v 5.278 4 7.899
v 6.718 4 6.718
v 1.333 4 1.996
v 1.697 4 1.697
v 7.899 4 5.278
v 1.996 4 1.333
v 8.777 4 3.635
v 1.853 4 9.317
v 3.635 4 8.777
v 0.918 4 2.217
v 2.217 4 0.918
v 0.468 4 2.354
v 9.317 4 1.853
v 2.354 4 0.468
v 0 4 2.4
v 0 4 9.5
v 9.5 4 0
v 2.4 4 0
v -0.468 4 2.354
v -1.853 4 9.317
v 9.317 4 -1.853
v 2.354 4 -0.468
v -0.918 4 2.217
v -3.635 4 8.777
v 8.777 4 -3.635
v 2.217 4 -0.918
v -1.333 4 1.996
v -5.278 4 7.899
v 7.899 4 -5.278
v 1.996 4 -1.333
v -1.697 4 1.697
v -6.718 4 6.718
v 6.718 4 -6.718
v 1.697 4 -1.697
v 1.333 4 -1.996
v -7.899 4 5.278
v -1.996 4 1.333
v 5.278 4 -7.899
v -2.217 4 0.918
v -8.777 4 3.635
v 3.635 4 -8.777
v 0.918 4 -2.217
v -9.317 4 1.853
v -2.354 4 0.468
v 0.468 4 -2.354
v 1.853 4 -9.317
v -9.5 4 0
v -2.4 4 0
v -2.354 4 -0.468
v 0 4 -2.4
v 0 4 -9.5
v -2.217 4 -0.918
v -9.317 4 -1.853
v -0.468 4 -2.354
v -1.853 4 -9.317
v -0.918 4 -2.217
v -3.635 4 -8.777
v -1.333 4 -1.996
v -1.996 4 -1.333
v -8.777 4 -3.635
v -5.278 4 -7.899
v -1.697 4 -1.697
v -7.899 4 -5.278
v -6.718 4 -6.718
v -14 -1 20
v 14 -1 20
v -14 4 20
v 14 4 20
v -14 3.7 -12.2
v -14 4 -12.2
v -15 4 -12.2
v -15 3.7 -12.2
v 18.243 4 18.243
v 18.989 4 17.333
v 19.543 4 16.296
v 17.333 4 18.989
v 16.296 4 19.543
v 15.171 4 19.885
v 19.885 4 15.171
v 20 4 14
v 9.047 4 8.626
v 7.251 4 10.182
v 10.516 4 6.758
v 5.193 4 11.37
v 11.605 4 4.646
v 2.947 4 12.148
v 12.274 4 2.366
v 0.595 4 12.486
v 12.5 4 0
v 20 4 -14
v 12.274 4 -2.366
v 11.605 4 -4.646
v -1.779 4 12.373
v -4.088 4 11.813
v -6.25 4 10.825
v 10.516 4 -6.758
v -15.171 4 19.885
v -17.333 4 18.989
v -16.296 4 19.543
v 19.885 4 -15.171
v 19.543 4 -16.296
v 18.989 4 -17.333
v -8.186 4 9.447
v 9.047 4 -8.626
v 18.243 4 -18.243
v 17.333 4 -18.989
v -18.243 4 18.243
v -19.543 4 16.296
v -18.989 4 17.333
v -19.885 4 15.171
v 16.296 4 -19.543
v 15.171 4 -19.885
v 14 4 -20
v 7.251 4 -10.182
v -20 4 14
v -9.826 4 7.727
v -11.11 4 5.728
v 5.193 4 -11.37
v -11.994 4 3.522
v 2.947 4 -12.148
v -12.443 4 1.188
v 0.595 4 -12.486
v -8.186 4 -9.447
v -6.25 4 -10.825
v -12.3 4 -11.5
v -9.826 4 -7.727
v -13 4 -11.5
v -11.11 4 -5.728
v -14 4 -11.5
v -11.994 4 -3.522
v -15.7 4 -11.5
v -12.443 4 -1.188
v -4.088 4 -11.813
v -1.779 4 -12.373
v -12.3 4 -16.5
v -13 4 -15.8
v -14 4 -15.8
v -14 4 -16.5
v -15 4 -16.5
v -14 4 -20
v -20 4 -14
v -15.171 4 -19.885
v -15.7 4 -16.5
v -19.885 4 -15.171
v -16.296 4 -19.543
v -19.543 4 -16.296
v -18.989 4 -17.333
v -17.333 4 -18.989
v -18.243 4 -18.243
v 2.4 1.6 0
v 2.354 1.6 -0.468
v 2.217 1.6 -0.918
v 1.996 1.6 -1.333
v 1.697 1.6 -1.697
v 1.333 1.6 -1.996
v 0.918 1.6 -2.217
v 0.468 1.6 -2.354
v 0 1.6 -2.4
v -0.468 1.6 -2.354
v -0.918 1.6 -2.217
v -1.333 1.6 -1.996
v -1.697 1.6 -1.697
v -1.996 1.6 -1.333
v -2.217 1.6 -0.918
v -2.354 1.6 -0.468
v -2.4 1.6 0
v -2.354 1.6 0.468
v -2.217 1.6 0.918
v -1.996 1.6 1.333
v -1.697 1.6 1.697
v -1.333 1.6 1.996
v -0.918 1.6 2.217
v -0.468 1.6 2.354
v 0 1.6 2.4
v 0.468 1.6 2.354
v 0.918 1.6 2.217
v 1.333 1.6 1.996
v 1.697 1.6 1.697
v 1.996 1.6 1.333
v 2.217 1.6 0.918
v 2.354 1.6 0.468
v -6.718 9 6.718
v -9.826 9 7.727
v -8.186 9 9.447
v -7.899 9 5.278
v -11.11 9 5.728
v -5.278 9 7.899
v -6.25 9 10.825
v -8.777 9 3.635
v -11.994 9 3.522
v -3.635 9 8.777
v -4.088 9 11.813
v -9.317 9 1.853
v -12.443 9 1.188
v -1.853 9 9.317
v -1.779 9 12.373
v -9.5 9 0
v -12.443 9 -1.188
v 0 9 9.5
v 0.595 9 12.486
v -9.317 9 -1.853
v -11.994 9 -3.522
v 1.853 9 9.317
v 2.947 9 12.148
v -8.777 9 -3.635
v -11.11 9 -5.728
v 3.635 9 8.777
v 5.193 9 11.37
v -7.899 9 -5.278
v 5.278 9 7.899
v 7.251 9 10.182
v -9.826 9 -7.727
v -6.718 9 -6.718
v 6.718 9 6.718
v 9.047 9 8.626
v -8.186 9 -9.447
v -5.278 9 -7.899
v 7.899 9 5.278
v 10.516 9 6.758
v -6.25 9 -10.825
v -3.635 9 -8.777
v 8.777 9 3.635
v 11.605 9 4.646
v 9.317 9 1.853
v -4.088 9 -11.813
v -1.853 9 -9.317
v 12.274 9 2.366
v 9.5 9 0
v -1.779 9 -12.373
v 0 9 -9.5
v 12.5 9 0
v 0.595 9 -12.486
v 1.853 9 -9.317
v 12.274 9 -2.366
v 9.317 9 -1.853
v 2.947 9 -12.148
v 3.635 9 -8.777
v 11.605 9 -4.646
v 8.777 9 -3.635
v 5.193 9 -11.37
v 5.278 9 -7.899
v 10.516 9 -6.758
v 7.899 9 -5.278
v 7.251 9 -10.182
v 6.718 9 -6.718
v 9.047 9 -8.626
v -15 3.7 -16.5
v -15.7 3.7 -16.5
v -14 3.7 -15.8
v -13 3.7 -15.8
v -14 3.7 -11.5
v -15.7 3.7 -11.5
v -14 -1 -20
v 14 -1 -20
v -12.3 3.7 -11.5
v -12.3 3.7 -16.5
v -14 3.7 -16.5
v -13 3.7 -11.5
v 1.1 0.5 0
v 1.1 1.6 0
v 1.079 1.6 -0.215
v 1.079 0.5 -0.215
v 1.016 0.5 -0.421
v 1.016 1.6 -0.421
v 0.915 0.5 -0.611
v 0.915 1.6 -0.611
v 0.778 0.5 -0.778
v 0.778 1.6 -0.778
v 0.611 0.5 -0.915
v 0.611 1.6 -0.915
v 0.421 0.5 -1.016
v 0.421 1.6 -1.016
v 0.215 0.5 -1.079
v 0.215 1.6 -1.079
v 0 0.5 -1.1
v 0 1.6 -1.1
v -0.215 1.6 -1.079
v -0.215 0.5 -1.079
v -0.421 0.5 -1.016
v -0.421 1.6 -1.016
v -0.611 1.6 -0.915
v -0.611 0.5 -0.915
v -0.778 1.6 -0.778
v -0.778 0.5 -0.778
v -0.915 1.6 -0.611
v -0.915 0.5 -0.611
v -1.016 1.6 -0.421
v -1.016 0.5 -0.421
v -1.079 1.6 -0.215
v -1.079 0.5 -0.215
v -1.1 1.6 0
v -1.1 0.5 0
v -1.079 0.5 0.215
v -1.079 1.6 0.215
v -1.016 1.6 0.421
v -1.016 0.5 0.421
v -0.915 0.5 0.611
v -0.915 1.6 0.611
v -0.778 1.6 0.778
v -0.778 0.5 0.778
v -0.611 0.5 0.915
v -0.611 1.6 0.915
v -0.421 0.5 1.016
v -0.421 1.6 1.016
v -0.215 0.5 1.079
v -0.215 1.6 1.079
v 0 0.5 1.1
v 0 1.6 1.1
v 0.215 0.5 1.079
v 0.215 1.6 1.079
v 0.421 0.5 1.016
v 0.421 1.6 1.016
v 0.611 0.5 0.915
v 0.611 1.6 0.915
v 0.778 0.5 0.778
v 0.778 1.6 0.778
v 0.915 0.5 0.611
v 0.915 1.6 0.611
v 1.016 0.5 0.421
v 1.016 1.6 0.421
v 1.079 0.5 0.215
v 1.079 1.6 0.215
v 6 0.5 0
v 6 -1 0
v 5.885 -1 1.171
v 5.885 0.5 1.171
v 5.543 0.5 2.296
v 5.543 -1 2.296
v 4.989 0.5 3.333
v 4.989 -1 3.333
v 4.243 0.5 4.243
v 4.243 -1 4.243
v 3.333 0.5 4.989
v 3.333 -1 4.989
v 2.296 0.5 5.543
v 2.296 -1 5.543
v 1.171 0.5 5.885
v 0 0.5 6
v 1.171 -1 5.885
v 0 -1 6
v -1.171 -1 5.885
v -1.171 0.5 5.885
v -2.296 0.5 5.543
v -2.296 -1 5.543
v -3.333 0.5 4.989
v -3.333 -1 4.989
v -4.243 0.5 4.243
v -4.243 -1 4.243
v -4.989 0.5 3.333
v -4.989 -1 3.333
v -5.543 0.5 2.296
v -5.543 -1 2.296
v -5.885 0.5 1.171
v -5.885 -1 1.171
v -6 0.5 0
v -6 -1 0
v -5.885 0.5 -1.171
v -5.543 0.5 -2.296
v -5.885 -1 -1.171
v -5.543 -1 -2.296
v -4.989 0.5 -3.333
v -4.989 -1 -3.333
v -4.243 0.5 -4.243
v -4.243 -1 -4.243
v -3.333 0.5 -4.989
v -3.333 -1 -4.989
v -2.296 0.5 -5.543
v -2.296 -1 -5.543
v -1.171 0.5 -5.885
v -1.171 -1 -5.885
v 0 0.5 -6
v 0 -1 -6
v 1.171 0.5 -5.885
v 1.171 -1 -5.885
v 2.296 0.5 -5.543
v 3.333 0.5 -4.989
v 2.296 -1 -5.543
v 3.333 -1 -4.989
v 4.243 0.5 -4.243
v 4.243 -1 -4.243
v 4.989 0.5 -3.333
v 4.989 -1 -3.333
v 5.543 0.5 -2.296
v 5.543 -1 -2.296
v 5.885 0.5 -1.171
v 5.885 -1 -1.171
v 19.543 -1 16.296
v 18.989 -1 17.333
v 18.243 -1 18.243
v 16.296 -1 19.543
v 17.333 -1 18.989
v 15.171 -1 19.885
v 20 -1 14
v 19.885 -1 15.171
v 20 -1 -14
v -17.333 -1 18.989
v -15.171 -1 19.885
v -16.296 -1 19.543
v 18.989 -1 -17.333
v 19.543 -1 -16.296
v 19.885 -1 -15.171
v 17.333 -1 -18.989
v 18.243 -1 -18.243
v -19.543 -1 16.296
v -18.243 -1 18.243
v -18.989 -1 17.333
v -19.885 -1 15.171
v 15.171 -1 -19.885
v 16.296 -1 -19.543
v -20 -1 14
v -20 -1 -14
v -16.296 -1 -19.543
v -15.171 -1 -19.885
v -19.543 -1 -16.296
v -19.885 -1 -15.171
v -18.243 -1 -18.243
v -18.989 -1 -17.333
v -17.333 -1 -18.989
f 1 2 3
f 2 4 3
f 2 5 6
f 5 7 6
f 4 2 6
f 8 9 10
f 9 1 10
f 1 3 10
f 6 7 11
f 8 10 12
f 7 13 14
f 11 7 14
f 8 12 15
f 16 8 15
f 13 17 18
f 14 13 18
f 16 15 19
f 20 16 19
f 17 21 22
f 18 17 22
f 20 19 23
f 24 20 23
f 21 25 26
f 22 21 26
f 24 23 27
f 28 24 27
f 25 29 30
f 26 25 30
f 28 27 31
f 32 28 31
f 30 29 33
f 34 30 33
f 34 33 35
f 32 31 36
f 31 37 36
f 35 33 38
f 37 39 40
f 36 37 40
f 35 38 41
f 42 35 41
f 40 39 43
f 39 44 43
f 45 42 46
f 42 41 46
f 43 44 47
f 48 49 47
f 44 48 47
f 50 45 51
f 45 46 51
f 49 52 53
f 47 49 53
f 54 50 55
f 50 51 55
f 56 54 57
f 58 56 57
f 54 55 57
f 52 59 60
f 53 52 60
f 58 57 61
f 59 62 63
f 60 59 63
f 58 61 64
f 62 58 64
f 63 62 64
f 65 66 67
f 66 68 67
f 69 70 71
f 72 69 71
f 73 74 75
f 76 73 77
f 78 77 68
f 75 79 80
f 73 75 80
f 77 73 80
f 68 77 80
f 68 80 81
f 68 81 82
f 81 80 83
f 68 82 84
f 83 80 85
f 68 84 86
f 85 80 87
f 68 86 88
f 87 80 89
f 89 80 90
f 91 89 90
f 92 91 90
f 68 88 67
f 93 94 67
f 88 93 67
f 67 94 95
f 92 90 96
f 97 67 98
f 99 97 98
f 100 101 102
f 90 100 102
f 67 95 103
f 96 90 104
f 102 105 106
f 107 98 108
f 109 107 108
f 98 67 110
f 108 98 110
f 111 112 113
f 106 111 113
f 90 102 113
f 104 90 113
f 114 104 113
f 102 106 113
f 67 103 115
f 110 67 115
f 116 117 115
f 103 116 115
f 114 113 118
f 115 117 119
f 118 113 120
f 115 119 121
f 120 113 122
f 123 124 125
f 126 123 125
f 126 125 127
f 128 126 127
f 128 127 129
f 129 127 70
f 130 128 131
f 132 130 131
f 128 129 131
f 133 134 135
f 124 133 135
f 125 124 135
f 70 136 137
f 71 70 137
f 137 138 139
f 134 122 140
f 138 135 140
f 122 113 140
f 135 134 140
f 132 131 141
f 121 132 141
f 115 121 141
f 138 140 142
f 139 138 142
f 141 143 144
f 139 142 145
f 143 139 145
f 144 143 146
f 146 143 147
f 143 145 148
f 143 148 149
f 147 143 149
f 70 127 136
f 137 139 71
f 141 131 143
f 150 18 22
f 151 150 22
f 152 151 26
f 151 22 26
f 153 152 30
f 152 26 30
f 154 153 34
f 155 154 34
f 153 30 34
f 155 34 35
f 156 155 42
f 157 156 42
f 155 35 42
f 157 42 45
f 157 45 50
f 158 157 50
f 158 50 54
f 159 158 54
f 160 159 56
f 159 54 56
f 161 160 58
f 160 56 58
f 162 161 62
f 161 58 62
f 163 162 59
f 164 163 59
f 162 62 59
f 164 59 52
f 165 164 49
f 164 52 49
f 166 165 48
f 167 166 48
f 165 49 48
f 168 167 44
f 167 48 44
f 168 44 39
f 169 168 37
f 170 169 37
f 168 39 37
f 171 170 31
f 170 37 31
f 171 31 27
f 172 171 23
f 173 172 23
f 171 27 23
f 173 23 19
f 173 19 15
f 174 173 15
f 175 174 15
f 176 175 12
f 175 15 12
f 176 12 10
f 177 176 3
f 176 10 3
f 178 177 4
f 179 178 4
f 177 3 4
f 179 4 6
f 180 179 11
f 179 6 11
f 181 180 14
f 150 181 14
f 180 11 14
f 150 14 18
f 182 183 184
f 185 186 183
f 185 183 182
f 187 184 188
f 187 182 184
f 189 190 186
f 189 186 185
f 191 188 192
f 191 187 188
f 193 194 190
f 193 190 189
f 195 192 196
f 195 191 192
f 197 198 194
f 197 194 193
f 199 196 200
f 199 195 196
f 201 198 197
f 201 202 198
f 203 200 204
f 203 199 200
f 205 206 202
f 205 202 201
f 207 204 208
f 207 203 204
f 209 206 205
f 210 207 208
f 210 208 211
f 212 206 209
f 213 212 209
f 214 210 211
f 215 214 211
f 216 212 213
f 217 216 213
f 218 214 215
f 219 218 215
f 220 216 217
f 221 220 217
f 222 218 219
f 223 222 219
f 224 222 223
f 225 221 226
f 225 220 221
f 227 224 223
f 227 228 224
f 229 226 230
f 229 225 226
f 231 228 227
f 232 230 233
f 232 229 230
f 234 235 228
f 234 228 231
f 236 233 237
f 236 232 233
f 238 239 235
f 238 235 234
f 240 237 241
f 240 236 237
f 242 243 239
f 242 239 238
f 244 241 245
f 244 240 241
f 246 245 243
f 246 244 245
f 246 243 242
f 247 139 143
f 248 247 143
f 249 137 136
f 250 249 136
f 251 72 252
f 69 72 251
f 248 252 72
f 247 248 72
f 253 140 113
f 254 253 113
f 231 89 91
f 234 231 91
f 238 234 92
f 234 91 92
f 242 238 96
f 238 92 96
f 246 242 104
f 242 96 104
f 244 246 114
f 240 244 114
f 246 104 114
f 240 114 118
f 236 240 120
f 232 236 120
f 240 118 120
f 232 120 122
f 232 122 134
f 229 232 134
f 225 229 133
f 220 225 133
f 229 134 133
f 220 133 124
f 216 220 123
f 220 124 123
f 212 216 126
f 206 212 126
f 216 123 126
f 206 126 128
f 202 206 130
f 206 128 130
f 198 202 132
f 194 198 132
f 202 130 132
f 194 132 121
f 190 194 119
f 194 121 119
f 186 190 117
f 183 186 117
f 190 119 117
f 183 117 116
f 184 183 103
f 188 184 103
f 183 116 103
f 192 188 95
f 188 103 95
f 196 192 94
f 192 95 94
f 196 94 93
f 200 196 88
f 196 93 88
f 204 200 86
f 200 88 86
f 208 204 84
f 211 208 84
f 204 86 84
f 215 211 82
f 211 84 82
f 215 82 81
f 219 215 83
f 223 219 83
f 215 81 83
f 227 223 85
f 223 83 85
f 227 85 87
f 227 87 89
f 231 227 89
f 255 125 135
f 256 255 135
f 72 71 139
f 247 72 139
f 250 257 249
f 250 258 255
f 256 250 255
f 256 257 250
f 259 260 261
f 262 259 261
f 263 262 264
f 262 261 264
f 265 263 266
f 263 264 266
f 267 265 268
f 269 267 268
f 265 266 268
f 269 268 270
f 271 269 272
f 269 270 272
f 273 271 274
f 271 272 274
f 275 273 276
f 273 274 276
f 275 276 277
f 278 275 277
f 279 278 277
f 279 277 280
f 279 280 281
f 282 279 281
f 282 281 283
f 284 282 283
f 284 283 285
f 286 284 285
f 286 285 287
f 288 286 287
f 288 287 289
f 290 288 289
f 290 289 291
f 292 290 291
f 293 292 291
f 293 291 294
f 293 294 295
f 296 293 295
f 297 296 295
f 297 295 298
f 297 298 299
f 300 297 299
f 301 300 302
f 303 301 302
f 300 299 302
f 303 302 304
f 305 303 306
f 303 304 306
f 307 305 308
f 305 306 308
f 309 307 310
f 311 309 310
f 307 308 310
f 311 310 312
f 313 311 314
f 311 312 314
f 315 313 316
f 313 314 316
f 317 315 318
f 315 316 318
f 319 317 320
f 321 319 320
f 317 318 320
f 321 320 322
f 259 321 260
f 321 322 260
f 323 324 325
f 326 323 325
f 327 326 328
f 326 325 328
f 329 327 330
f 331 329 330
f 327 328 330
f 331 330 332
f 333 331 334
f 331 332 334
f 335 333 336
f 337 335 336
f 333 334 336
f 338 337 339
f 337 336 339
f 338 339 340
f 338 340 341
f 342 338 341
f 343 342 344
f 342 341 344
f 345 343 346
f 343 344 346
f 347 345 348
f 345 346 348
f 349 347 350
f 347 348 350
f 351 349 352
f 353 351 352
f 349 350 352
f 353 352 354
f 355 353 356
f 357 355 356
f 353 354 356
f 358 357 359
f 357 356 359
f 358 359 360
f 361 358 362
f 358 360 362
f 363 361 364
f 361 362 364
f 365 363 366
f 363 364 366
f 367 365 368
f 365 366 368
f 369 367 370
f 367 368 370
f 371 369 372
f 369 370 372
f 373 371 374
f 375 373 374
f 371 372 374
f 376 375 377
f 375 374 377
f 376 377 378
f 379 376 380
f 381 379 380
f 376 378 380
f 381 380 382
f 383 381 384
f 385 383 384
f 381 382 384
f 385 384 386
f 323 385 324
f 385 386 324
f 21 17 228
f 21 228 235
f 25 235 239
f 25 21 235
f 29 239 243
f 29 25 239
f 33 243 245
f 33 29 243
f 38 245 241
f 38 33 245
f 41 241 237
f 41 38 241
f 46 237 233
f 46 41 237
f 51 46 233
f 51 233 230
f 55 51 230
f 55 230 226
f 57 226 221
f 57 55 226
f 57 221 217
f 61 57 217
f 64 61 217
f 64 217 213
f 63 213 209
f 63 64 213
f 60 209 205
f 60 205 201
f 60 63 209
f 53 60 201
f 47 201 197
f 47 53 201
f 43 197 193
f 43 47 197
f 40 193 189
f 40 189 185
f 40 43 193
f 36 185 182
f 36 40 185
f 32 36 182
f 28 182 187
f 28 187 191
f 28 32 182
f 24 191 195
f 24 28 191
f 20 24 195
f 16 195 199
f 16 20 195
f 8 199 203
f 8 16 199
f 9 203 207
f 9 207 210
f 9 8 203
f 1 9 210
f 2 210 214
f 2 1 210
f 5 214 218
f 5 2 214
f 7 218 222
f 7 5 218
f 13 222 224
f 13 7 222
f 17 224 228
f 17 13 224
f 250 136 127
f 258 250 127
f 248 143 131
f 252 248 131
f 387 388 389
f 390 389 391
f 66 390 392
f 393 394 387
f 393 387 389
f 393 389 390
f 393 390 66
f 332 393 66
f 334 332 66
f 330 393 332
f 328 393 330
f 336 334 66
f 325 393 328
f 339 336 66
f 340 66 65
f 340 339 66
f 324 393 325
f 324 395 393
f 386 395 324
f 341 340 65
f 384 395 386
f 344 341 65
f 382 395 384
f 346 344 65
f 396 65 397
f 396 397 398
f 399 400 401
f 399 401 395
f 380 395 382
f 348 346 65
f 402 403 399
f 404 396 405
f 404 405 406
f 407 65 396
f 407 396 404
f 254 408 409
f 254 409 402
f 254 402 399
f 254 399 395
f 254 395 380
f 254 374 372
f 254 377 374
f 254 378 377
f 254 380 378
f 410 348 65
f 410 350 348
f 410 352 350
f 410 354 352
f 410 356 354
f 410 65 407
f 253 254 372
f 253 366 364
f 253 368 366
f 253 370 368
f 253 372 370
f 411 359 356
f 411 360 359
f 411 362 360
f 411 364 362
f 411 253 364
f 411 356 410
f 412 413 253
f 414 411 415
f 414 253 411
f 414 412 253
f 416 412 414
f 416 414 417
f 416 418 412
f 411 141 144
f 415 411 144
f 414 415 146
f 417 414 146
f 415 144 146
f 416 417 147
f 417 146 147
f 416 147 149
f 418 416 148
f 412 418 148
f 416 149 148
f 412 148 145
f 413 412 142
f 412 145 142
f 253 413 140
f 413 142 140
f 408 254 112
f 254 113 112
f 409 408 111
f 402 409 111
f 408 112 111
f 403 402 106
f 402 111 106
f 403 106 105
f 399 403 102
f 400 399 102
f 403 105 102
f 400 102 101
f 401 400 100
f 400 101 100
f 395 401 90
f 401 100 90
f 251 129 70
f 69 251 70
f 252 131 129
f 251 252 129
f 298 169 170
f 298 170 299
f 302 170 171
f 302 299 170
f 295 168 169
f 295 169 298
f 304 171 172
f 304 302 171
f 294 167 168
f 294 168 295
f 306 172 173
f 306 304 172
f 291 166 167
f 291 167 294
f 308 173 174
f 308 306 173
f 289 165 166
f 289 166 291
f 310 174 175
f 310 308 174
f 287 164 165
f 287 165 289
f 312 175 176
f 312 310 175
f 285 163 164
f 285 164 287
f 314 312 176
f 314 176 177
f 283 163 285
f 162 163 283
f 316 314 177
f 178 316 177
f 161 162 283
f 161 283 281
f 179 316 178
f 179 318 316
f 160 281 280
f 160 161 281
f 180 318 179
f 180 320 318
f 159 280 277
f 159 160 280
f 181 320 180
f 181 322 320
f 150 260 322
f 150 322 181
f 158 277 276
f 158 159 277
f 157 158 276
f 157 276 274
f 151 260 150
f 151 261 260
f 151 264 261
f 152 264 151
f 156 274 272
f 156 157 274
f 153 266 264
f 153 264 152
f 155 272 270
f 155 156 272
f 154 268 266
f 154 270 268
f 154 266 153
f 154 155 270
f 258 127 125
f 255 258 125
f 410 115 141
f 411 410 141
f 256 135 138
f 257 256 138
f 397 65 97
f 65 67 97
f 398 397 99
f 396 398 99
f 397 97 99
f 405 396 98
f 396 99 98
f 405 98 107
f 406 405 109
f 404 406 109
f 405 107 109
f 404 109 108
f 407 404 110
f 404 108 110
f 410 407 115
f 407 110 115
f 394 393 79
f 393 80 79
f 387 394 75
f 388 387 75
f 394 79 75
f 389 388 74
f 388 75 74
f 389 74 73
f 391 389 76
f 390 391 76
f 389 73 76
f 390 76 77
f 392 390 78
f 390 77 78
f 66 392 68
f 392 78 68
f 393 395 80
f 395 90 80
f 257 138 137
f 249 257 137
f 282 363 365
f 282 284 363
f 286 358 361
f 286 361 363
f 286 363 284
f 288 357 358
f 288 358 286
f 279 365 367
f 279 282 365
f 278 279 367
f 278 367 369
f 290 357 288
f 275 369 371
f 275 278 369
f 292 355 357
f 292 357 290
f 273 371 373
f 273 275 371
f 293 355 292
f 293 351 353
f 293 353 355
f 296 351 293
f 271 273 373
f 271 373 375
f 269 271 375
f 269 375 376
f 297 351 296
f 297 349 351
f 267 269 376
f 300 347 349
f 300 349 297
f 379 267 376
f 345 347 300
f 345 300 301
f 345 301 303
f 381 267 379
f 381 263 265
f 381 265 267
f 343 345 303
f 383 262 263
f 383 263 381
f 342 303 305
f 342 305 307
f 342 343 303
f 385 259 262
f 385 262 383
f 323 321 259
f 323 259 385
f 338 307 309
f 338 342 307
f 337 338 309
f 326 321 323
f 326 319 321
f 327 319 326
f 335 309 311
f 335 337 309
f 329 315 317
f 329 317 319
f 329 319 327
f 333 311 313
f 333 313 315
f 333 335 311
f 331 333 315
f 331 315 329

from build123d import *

# Parameters (mm, degrees)
SALIENTE_EXTRUIR1_DEPTH      = 4
SALIENTE_EXTRUIR1_DEPTH_BACK = 1
CROQUIS4_R                   = 6
CORTAR_EXTRUIR1_DEPTH        = 1.5
CROQUIS8_R                   = 2.4
CORTAR_EXTRUIR2_DEPTH        = 2.4
CORTAR_EXTRUIR3_REACH        = 4.6
CROQUIS9_R                   = 1.1
CROQUIS10_R                  = 12.5
CROQUIS10_R_2                = 9.5
EXTRUIR_L_MINA1_DEPTH        = 5
CORTAR_EXTRUIR4_DEPTH        = 0.3


with BuildPart() as part:
    # Croquis1 → Saliente-Extruir1 (new body, two sides)
    with BuildSketch(Plane(origin=(0, 0, 0), x_dir=(1, 0, 0), z_dir=(0, 1, 0))) as saliente_extruir1_sk:
        with BuildLine():
            Line((-14, 20), (14, 20))
            ThreePointArc((14, 20), (18.242640687, 18.242640687), (20, 14))
            Line((20, 14), (20, -14))
            ThreePointArc((20, -14), (18.242640687, -18.242640687), (14, -20))
            Line((14, -20), (-14, -20))
            ThreePointArc((-14, -20), (-18.242640687, -18.242640687), (-20, -14))
            Line((-20, -14), (-20, 14))
            ThreePointArc((-20, 14), (-18.242640687, 18.242640687), (-14, 20))
        make_face()
    extrude(amount=SALIENTE_EXTRUIR1_DEPTH)
    extrude(saliente_extruir1_sk.sketch, amount=-SALIENTE_EXTRUIR1_DEPTH_BACK)

    # Croquis4 → Cortar-Extruir1 (cut)
    with BuildSketch(Plane.XZ.offset(1)):
        Circle(CROQUIS4_R)
    extrude(amount=-CORTAR_EXTRUIR1_DEPTH, mode=Mode.SUBTRACT)

    # Croquis8 → Cortar-Extruir2 (cut)
    with BuildSketch(Plane(origin=(0, 4, 0), x_dir=(1, 0, 0), z_dir=(0, 1, 0))):
        Circle(CROQUIS8_R)
    extrude(amount=-CORTAR_EXTRUIR2_DEPTH, mode=Mode.SUBTRACT)

    # Croquis9 → Cortar-Extruir3 (cut, up to next)
    with BuildSketch(Plane(origin=(0, 1.6, 0), x_dir=(1, 0, 0), z_dir=(0, 1, 0)), mode=Mode.PRIVATE) as cortar_extruir3_sk1:
        Circle(CROQUIS9_R)
    cortar_extruir3_tool1 = extrude(cortar_extruir3_sk1.sketch, amount=-CORTAR_EXTRUIR3_REACH, mode=Mode.PRIVATE) & part.part
    add(cortar_extruir3_tool1.solids().sort_by_distance((0, 1.6, 0))[0], mode=Mode.SUBTRACT)

    # Croquis10 → Extruir-Lámina1 (add)
    with BuildSketch(Plane(origin=(0, 4, 0), x_dir=(1, 0, 0), z_dir=(0, 1, 0))):
        Circle(CROQUIS10_R)
        Circle(CROQUIS10_R_2, mode=Mode.SUBTRACT)
    extrude(amount=EXTRUIR_L_MINA1_DEPTH)

    # Croquis11 → Cortar-Extruir4 (cut)
    with BuildSketch(Plane(origin=(0, 4, 0), x_dir=(1, 0, 0), z_dir=(0, 1, 0))):
        Polygon((-14, 11.5), (-14, 12.2), (-15, 12.2), (-15, 16.5), (-15.7, 16.5), (-15.7, 11.5), align=None)
        Polygon((-12.3, 16.5), (-14, 16.5), (-14, 15.8), (-13, 15.8), (-13, 11.5), (-12.3, 11.5), align=None)
    extrude(amount=-CORTAR_EXTRUIR4_DEPTH, mode=Mode.SUBTRACT)


solid = part.part
